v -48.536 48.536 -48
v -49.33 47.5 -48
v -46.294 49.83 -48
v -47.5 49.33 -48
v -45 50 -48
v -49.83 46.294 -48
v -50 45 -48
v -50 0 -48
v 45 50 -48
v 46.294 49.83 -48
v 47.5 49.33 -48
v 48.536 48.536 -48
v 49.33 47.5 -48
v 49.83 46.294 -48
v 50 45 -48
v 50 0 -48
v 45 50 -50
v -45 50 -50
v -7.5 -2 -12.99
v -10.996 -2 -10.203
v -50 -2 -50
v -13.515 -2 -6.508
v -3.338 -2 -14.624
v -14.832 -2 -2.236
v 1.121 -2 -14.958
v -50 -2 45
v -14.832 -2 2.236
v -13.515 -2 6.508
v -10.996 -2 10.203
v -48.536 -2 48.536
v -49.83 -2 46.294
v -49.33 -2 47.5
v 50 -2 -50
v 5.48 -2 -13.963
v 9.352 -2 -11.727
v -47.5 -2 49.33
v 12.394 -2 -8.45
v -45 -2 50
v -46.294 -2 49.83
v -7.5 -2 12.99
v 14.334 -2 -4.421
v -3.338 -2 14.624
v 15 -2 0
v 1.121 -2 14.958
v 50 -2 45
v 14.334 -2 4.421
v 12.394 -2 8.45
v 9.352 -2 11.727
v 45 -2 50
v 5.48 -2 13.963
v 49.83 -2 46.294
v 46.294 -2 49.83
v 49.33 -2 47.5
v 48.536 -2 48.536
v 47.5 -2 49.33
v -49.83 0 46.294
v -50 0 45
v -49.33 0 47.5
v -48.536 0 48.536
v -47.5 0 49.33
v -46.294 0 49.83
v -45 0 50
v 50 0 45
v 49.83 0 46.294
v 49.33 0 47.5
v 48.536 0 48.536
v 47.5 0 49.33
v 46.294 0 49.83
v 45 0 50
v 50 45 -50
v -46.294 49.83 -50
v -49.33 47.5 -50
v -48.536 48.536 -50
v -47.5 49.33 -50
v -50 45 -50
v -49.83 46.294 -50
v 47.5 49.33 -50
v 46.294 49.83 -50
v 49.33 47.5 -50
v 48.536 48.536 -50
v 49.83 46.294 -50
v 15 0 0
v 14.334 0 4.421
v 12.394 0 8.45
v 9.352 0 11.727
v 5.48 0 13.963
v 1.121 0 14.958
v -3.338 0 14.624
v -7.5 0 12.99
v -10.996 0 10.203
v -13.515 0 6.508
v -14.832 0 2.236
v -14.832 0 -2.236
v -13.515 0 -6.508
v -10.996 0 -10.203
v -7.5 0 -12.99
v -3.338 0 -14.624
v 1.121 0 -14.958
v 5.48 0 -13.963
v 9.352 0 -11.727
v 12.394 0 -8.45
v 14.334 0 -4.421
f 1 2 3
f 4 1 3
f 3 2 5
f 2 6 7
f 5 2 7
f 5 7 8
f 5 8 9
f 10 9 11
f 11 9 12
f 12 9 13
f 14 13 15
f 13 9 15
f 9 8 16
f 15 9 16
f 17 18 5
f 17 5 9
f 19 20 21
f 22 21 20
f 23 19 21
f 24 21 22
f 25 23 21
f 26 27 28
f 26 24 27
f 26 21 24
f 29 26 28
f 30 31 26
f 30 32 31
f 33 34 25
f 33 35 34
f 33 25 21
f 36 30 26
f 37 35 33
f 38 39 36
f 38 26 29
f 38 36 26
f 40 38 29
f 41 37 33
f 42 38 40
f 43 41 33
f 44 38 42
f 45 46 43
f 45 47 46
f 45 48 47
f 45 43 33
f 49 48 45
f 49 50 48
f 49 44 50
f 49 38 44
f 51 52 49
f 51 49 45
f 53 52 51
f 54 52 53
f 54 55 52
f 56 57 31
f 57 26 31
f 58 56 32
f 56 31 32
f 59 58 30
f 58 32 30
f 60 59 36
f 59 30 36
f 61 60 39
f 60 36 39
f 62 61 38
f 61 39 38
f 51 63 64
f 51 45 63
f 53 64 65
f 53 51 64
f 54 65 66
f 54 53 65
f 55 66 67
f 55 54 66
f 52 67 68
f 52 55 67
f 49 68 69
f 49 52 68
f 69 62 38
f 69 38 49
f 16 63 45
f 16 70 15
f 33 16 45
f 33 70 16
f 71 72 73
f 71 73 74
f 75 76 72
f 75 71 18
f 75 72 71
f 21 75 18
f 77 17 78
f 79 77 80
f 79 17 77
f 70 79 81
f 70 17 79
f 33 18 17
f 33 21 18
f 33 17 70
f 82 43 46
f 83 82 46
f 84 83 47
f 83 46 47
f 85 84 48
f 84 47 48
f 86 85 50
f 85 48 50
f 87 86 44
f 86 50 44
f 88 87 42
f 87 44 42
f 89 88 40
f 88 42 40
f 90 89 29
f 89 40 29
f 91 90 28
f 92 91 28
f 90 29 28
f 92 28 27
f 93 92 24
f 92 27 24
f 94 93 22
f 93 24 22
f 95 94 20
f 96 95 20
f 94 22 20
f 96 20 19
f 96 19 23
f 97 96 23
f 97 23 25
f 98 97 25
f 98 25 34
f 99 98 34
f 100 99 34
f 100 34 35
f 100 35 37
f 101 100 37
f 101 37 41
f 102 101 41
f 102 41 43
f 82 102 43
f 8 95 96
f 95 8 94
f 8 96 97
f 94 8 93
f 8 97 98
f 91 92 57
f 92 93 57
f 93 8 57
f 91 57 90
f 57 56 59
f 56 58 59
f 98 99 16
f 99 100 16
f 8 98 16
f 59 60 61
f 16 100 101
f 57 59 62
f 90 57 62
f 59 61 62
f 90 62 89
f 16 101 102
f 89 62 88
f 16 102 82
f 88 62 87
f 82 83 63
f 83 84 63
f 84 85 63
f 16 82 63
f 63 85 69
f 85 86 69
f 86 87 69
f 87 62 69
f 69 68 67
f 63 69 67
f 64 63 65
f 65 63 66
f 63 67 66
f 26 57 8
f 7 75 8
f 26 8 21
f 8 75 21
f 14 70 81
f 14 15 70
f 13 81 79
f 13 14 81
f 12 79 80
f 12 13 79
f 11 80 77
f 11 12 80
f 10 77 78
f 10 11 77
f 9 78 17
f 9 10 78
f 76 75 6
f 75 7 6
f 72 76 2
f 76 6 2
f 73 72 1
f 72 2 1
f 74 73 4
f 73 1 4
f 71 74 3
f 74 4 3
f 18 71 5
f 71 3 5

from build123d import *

# Parameters (mm, degrees)
F0_W     = 100
F0_H     = 100
F1_DEPTH = 2
F2_R     = 15
F3_DEPTH = 25
F4_W     = 100
F4_H     = 50
F5_DEPTH = 2
F6_R     = 5


with BuildPart() as f1:
    # F0 (on Front) → F1 (new body)
    with BuildSketch(Plane.XZ):
        Rectangle(F0_W, F0_H)
    extrude(amount=F1_DEPTH)

    # F2 (on face) → F3 (cut)
    with BuildSketch(Plane.XZ.offset(2)):
        Circle(F2_R)
    extrude(amount=-F3_DEPTH, mode=Mode.SUBTRACT)

    # F4 (on face) → F5 (join)
    with BuildSketch(Plane(origin=(0, 0, -50), x_dir=(1, 0, 0), z_dir=(0, 0, -1))):
        with Locations((0, -25)):
            Rectangle(F4_W, F4_H)
    extrude(amount=-F5_DEPTH)

    # F6
    f6_edges = [f1.edges().sort_by_distance(p)[0] for p in [
        (50, -1, 50),
        (50, 50, -49),
        (-50, 50, -49),
        (-50, -1, 50),
    ]]
    fillet(f6_edges, radius=F6_R)


solid = f1.part
